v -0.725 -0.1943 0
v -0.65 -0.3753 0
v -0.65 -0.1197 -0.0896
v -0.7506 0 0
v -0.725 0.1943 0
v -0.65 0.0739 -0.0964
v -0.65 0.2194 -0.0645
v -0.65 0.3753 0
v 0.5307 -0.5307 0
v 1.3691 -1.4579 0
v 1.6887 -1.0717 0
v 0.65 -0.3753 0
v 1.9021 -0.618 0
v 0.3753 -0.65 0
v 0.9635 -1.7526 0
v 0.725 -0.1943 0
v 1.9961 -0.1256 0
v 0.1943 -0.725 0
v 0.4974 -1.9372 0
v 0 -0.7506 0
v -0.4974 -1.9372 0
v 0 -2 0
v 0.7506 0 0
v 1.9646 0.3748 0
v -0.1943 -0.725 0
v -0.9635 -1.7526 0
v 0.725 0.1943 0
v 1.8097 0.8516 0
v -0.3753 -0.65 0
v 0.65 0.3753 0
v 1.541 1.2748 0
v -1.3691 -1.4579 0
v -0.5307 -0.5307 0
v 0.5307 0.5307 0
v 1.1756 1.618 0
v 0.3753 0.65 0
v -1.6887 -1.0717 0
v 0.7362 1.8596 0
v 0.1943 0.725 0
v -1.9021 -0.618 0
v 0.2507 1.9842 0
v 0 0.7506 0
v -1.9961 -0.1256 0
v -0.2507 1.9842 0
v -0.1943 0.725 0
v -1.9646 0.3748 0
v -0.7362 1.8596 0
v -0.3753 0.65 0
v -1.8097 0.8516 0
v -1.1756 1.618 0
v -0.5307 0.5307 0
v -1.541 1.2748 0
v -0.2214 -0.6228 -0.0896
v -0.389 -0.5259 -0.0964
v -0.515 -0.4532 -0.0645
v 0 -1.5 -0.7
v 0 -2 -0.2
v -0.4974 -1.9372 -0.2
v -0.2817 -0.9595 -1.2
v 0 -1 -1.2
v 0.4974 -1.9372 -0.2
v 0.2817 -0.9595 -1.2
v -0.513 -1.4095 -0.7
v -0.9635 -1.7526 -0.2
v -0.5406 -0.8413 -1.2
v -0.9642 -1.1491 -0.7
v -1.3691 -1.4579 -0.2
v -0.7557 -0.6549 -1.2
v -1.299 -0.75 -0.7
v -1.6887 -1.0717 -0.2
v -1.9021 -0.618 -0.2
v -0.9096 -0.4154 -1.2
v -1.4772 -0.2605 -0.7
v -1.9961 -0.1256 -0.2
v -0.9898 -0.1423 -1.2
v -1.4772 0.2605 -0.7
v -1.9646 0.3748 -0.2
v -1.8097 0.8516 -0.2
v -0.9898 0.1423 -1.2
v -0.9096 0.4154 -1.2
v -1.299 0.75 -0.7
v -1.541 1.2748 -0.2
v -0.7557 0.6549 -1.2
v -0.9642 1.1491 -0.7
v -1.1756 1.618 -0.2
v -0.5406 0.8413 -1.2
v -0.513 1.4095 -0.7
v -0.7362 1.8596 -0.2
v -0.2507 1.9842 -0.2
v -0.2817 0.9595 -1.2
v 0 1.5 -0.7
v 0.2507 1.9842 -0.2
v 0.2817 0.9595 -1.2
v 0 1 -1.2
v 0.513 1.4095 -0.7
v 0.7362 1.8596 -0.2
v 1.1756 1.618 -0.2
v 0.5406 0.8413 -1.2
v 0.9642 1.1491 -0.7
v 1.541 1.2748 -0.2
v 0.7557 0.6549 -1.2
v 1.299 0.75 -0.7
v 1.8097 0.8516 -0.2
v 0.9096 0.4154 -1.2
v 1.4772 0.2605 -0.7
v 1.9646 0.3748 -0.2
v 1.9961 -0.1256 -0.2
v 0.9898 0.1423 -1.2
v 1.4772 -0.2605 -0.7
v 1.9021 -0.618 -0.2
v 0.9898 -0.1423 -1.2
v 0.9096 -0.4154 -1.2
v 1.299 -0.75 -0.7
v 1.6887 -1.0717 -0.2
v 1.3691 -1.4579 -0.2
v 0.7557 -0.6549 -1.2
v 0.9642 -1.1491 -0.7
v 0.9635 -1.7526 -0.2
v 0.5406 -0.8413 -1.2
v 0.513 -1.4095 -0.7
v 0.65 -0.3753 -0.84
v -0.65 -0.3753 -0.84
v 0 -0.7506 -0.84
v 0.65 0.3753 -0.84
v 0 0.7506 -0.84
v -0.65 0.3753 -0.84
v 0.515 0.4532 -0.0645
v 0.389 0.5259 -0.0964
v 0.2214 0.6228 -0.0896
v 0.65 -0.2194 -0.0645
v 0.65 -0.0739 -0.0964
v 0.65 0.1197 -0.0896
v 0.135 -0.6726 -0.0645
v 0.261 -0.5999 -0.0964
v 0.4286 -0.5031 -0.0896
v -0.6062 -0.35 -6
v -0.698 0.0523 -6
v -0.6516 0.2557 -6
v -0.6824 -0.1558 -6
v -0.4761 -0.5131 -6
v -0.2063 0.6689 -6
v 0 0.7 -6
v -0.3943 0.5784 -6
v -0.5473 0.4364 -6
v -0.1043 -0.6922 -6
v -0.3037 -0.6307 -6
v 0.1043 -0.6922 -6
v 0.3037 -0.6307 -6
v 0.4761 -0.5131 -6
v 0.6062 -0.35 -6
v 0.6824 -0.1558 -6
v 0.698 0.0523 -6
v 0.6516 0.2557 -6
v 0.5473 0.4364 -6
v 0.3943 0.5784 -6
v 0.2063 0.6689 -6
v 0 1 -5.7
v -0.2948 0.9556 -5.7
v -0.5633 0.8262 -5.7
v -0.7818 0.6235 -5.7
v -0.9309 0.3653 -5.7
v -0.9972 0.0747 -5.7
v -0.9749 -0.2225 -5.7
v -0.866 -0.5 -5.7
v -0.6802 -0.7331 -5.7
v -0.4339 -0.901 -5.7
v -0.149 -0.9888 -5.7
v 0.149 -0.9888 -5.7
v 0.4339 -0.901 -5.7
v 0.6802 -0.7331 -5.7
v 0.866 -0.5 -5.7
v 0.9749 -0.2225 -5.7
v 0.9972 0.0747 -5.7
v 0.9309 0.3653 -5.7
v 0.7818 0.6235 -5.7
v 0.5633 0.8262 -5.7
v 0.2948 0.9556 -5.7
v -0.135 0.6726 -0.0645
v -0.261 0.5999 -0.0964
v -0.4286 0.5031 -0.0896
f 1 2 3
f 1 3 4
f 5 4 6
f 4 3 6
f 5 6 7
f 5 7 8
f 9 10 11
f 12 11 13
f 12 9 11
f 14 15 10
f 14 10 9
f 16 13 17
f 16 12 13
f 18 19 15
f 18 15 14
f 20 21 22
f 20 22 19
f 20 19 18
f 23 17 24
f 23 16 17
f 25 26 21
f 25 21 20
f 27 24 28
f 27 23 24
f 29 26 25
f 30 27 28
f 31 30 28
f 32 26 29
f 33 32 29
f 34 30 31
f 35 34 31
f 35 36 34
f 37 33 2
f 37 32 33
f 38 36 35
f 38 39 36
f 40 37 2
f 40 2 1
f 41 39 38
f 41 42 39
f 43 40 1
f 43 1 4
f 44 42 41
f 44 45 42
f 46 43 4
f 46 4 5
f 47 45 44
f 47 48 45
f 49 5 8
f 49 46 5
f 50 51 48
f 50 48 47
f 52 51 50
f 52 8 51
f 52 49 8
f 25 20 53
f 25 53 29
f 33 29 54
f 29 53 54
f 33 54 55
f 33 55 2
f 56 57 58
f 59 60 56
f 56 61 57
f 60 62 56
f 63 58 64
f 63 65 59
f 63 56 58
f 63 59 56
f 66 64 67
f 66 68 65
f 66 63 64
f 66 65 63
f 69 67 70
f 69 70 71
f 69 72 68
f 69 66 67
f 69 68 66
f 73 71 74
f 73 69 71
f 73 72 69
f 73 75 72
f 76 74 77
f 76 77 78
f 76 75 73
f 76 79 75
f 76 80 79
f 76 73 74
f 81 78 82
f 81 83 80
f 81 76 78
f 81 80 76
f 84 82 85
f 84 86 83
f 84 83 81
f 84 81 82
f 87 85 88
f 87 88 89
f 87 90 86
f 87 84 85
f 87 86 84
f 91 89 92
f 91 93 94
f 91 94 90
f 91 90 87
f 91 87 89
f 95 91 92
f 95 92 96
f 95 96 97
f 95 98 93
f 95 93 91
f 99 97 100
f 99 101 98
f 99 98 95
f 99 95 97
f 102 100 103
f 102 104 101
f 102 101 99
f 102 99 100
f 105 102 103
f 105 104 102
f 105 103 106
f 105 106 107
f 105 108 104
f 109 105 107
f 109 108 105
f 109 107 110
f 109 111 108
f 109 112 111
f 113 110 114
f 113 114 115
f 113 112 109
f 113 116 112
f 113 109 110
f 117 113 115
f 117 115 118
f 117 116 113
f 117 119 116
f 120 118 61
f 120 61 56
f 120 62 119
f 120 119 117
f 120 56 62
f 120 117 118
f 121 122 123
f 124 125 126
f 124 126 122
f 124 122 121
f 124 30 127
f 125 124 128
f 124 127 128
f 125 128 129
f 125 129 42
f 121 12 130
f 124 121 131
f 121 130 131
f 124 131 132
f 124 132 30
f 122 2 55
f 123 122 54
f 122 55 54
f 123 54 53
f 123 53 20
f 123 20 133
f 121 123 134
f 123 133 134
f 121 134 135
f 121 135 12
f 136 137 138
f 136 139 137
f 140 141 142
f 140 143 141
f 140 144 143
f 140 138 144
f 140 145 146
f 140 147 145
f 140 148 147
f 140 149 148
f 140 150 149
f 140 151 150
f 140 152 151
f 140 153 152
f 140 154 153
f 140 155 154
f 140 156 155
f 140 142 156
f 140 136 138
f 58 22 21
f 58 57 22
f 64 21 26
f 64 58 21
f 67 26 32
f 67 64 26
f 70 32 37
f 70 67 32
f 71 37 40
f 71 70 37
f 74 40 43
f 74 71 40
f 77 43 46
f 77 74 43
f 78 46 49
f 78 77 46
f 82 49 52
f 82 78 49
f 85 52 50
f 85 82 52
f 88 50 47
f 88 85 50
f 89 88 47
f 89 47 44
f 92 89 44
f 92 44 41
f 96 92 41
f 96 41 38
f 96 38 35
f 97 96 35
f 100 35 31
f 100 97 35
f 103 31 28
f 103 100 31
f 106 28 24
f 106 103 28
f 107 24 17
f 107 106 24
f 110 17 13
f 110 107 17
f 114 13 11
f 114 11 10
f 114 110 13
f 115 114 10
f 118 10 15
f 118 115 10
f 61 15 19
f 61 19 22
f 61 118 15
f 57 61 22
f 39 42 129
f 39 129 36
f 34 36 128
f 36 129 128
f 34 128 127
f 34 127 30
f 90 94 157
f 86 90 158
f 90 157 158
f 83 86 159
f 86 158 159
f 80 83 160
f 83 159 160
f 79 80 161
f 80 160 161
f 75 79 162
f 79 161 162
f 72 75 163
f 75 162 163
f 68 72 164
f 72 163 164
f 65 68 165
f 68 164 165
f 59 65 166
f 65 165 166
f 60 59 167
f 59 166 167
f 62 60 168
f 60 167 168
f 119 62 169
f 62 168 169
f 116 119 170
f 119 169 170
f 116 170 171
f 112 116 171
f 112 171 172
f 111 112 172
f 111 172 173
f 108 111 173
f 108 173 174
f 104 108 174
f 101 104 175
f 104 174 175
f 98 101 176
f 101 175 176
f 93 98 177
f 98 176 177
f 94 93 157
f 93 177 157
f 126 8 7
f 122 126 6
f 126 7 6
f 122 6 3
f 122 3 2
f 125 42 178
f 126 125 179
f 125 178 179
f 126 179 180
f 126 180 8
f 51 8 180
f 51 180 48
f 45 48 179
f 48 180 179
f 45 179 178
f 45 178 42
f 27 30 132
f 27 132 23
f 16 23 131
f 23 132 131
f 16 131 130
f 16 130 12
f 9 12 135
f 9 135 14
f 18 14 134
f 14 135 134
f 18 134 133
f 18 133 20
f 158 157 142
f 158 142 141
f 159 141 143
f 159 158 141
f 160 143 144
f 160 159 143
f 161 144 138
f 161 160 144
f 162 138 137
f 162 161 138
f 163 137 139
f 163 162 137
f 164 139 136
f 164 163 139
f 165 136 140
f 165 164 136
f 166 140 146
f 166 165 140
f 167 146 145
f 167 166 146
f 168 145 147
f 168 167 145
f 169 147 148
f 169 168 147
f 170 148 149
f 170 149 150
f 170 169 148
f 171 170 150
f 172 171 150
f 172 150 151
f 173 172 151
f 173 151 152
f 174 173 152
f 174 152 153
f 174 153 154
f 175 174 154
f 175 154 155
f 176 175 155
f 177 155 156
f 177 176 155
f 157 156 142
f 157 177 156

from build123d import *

# Parameters (mm, degrees)
SKETCH1_W          = 6
SKETCH1_H          = 1
CHAMFER1_SIZE      = 0.3
CUT_EXTRUDE2_DEPTH = 0.84


with BuildPart() as part:
    # Sketch1 → Revolve1 (revolve)
    with BuildSketch(Plane(origin=(0, 0, 0), x_dir=(0, 0, -1), z_dir=(1, 0, 0))):
        with Locations((3, 0.5)):
            Rectangle(SKETCH1_W, SKETCH1_H)
    revolve(axis=Axis((0, 0, -6), (0, 0, 1)))

    # Chamfer1
    chamfer1_edges = [part.edges().sort_by_distance(p)[0] for p in [
        (0, -1, -6),
    ]]
    chamfer(chamfer1_edges, length=CHAMFER1_SIZE)

    # Sketch7 → Revolve2 (revolve)
    with BuildSketch(Plane(origin=(0, 0, 0), x_dir=(0, 0, -1), z_dir=(1, 0, 0)), mode=Mode.PRIVATE) as revolve2_sk:
        Polygon((0, 2), (0.2, 2), (1.2, 1), (1.2, 0), (0, 0), align=None)
    revolve(revolve2_sk.sketch.rotate(Axis((0, 0, 0), (0, 0, -1)), 180), axis=Axis((0, 0, 0), (0, 0, -1)))

    # Boss-Extrude1 cone 1 section (through the dimple's axis) → Boss-Extrude1 (revolve)
    with BuildSketch(Plane(origin=(0, 0, -1.2), x_dir=(0, -1, 0), z_dir=(1, 0, 0))):
        Polygon((0, 0), (1, 0), (0, 1), align=None)
    revolve(axis=Axis((0, 0, -1.2), (0, 0, -1)))

    # Sketch5 → Cut-Extrude2 (cut)
    with BuildSketch(Plane.XY):
        Polygon((0.65, -0.375277675), (0.65, 0.375277675), (0, 0.75055535), (-0.65, 0.375277675), (-0.65, -0.375277675), (0, -0.75055535), align=None)
    extrude(amount=-CUT_EXTRUDE2_DEPTH, mode=Mode.SUBTRACT)

    # Cut-Extrude3 cone 1 section (through the dimple's axis) → Cut-Extrude3 (revolve, cut)
    with BuildSketch(Plane(origin=(0, 0, 0), x_dir=(0, -1, 0), z_dir=(1, 0, 0))):
        Polygon((0, 0), (0.75055535, 0), (0, 0.75055535), align=None)
    revolve(axis=Axis((0, 0, 0), (0, 0, -1)), mode=Mode.SUBTRACT)


solid = part.part
